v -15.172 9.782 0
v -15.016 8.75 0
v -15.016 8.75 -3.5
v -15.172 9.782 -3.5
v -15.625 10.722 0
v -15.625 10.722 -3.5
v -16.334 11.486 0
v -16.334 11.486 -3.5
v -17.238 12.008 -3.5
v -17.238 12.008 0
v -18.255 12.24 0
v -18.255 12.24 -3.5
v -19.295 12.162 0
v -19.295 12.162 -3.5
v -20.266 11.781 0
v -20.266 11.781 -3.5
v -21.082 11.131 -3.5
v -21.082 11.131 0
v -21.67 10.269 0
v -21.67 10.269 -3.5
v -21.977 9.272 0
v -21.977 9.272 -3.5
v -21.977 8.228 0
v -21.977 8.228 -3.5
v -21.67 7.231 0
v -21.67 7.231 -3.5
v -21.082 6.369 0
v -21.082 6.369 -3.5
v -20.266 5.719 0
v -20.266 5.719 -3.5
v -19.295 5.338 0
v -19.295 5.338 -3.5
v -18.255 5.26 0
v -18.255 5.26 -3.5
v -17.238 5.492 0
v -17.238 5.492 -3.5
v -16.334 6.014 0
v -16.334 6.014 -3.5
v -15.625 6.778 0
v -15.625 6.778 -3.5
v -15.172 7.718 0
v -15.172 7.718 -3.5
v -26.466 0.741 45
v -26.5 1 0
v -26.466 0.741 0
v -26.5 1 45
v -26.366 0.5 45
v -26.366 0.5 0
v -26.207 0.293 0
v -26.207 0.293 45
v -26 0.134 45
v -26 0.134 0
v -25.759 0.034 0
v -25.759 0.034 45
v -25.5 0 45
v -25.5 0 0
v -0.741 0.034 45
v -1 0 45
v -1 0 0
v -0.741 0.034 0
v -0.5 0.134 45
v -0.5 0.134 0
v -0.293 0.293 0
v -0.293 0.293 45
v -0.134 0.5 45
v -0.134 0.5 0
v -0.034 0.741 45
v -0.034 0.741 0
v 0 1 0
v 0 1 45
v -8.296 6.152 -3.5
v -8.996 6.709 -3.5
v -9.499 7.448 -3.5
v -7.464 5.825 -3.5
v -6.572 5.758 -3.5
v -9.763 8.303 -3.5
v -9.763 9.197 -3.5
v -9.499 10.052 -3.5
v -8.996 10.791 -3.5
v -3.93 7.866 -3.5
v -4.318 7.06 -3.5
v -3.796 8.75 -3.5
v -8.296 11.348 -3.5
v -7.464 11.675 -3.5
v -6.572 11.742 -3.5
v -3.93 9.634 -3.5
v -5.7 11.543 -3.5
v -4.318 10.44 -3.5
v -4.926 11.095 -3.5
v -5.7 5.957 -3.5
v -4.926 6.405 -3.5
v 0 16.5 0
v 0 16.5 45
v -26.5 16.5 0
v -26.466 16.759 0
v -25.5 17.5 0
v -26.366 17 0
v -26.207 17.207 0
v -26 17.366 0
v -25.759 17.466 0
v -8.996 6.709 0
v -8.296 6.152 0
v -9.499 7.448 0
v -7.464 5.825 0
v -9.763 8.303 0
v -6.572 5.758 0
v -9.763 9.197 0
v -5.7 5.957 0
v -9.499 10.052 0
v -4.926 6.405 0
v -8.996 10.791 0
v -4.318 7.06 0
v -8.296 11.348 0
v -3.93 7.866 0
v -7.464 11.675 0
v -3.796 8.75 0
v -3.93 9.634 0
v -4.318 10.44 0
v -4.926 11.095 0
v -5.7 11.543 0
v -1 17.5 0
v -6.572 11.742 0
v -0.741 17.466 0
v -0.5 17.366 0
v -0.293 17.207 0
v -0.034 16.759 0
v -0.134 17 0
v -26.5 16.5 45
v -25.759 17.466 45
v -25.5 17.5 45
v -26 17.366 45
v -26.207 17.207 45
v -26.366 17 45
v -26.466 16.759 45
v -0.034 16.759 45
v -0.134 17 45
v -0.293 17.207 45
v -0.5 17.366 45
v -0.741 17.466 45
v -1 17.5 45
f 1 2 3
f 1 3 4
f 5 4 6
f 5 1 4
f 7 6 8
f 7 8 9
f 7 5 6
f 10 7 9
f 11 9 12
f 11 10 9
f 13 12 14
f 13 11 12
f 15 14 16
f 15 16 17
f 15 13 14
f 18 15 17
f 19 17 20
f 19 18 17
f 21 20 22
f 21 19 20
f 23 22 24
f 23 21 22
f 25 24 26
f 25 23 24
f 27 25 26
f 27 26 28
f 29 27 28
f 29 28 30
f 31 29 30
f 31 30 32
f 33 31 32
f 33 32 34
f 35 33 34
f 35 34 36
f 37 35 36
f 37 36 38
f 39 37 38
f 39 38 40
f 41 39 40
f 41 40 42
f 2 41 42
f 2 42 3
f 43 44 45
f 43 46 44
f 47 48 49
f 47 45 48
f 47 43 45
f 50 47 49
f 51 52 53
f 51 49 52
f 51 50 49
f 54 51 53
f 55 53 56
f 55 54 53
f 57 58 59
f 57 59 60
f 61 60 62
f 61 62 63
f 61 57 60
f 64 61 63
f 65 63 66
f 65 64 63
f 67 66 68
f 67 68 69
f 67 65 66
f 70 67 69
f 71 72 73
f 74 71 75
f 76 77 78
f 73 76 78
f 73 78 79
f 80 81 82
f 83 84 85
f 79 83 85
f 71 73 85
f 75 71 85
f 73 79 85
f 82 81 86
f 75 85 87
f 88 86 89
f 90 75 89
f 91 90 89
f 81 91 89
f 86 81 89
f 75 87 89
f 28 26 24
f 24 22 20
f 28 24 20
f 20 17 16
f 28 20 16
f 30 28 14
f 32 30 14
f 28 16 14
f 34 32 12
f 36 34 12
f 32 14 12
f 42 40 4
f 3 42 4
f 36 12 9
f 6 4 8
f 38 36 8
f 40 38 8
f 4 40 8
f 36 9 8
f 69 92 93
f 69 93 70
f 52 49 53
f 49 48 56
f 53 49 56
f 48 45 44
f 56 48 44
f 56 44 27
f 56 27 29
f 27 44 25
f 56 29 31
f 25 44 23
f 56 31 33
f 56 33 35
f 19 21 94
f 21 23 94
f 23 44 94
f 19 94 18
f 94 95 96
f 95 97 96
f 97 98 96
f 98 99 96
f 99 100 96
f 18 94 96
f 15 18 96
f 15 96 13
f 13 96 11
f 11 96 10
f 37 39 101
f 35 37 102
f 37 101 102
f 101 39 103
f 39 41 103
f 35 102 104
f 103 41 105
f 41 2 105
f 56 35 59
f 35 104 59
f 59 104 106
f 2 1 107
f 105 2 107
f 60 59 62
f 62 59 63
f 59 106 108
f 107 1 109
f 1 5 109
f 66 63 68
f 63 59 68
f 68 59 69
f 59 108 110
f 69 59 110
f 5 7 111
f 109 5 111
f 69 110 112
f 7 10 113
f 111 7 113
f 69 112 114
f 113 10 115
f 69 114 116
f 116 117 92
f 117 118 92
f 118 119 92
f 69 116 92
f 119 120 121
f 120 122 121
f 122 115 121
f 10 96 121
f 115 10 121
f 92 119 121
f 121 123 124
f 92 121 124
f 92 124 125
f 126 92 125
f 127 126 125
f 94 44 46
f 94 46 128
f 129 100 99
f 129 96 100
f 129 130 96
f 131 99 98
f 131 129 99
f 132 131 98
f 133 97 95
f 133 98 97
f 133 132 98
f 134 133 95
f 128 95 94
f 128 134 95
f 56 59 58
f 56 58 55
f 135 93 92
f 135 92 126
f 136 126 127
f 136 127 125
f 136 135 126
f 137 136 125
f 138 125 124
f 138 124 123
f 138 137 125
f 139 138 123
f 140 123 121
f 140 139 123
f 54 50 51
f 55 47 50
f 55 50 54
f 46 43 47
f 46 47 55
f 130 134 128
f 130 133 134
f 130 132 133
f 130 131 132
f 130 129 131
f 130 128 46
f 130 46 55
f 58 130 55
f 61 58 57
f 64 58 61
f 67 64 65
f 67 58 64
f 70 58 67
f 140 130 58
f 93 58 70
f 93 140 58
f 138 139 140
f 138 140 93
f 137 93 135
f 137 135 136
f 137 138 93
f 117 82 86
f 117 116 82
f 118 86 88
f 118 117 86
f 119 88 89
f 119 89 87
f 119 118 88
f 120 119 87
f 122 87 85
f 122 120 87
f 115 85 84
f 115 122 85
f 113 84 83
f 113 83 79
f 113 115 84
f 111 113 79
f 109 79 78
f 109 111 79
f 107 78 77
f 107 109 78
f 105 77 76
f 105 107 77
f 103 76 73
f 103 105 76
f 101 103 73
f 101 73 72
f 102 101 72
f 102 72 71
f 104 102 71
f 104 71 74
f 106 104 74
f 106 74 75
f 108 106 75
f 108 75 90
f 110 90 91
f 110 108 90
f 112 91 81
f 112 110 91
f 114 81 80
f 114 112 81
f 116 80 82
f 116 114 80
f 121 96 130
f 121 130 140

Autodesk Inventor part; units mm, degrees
ref_plane "YZ Plane" through (0, 0, 0) normal (1, 0, 0) x (0, 1, 0)
ref_plane "XZ Plane" through (0, 0, 0) normal (0, 1, 0) x (-1, 0, 0)
ref_plane "XY Plane" through (0, 0, 0) normal (0, 0, 1) x (1, 0, 0)
sketch "スケッチ1" plane through (0, 0, 0) normal (0, 0, 1) x (1, 0, 0)
  line L0 (0, 0) -> (-26.5, 0)
  line L1 (-26.5, 0) -> (-26.5, 17.5)
  line L2 (-26.5, 17.5) -> (0, 17.5)
  line L3 (0, 17.5) -> (0, 0)
  circle A0 centre (-18.5164, 8.75) radius 3.5
  circle A1 centre (-6.7964, 8.75) radius 3
  dimension "d1" = 26.5
  dimension "d2" = 17.5
  dimension "d3" = 7
  dimension "d4" = 6
  dimension "d5" = 8.75
  dimension "d6" = 8.75
extrude "押し出し1" add sketch "スケッチ1" along normal blind 45 contours L0 L1 L2 L3 | A0 | A1
extrude "押し出し2" add sketch "スケッチ1" against normal blind 3.5 contours A0 | A1
fillet "フィレット1" radius 1 4 edges at (-26.5, 17.5, 22.5) (-26.5, 0, 22.5) (0, 17.5, 22.5) (0, 0, 22.5)
properties part number "Battery06P"
